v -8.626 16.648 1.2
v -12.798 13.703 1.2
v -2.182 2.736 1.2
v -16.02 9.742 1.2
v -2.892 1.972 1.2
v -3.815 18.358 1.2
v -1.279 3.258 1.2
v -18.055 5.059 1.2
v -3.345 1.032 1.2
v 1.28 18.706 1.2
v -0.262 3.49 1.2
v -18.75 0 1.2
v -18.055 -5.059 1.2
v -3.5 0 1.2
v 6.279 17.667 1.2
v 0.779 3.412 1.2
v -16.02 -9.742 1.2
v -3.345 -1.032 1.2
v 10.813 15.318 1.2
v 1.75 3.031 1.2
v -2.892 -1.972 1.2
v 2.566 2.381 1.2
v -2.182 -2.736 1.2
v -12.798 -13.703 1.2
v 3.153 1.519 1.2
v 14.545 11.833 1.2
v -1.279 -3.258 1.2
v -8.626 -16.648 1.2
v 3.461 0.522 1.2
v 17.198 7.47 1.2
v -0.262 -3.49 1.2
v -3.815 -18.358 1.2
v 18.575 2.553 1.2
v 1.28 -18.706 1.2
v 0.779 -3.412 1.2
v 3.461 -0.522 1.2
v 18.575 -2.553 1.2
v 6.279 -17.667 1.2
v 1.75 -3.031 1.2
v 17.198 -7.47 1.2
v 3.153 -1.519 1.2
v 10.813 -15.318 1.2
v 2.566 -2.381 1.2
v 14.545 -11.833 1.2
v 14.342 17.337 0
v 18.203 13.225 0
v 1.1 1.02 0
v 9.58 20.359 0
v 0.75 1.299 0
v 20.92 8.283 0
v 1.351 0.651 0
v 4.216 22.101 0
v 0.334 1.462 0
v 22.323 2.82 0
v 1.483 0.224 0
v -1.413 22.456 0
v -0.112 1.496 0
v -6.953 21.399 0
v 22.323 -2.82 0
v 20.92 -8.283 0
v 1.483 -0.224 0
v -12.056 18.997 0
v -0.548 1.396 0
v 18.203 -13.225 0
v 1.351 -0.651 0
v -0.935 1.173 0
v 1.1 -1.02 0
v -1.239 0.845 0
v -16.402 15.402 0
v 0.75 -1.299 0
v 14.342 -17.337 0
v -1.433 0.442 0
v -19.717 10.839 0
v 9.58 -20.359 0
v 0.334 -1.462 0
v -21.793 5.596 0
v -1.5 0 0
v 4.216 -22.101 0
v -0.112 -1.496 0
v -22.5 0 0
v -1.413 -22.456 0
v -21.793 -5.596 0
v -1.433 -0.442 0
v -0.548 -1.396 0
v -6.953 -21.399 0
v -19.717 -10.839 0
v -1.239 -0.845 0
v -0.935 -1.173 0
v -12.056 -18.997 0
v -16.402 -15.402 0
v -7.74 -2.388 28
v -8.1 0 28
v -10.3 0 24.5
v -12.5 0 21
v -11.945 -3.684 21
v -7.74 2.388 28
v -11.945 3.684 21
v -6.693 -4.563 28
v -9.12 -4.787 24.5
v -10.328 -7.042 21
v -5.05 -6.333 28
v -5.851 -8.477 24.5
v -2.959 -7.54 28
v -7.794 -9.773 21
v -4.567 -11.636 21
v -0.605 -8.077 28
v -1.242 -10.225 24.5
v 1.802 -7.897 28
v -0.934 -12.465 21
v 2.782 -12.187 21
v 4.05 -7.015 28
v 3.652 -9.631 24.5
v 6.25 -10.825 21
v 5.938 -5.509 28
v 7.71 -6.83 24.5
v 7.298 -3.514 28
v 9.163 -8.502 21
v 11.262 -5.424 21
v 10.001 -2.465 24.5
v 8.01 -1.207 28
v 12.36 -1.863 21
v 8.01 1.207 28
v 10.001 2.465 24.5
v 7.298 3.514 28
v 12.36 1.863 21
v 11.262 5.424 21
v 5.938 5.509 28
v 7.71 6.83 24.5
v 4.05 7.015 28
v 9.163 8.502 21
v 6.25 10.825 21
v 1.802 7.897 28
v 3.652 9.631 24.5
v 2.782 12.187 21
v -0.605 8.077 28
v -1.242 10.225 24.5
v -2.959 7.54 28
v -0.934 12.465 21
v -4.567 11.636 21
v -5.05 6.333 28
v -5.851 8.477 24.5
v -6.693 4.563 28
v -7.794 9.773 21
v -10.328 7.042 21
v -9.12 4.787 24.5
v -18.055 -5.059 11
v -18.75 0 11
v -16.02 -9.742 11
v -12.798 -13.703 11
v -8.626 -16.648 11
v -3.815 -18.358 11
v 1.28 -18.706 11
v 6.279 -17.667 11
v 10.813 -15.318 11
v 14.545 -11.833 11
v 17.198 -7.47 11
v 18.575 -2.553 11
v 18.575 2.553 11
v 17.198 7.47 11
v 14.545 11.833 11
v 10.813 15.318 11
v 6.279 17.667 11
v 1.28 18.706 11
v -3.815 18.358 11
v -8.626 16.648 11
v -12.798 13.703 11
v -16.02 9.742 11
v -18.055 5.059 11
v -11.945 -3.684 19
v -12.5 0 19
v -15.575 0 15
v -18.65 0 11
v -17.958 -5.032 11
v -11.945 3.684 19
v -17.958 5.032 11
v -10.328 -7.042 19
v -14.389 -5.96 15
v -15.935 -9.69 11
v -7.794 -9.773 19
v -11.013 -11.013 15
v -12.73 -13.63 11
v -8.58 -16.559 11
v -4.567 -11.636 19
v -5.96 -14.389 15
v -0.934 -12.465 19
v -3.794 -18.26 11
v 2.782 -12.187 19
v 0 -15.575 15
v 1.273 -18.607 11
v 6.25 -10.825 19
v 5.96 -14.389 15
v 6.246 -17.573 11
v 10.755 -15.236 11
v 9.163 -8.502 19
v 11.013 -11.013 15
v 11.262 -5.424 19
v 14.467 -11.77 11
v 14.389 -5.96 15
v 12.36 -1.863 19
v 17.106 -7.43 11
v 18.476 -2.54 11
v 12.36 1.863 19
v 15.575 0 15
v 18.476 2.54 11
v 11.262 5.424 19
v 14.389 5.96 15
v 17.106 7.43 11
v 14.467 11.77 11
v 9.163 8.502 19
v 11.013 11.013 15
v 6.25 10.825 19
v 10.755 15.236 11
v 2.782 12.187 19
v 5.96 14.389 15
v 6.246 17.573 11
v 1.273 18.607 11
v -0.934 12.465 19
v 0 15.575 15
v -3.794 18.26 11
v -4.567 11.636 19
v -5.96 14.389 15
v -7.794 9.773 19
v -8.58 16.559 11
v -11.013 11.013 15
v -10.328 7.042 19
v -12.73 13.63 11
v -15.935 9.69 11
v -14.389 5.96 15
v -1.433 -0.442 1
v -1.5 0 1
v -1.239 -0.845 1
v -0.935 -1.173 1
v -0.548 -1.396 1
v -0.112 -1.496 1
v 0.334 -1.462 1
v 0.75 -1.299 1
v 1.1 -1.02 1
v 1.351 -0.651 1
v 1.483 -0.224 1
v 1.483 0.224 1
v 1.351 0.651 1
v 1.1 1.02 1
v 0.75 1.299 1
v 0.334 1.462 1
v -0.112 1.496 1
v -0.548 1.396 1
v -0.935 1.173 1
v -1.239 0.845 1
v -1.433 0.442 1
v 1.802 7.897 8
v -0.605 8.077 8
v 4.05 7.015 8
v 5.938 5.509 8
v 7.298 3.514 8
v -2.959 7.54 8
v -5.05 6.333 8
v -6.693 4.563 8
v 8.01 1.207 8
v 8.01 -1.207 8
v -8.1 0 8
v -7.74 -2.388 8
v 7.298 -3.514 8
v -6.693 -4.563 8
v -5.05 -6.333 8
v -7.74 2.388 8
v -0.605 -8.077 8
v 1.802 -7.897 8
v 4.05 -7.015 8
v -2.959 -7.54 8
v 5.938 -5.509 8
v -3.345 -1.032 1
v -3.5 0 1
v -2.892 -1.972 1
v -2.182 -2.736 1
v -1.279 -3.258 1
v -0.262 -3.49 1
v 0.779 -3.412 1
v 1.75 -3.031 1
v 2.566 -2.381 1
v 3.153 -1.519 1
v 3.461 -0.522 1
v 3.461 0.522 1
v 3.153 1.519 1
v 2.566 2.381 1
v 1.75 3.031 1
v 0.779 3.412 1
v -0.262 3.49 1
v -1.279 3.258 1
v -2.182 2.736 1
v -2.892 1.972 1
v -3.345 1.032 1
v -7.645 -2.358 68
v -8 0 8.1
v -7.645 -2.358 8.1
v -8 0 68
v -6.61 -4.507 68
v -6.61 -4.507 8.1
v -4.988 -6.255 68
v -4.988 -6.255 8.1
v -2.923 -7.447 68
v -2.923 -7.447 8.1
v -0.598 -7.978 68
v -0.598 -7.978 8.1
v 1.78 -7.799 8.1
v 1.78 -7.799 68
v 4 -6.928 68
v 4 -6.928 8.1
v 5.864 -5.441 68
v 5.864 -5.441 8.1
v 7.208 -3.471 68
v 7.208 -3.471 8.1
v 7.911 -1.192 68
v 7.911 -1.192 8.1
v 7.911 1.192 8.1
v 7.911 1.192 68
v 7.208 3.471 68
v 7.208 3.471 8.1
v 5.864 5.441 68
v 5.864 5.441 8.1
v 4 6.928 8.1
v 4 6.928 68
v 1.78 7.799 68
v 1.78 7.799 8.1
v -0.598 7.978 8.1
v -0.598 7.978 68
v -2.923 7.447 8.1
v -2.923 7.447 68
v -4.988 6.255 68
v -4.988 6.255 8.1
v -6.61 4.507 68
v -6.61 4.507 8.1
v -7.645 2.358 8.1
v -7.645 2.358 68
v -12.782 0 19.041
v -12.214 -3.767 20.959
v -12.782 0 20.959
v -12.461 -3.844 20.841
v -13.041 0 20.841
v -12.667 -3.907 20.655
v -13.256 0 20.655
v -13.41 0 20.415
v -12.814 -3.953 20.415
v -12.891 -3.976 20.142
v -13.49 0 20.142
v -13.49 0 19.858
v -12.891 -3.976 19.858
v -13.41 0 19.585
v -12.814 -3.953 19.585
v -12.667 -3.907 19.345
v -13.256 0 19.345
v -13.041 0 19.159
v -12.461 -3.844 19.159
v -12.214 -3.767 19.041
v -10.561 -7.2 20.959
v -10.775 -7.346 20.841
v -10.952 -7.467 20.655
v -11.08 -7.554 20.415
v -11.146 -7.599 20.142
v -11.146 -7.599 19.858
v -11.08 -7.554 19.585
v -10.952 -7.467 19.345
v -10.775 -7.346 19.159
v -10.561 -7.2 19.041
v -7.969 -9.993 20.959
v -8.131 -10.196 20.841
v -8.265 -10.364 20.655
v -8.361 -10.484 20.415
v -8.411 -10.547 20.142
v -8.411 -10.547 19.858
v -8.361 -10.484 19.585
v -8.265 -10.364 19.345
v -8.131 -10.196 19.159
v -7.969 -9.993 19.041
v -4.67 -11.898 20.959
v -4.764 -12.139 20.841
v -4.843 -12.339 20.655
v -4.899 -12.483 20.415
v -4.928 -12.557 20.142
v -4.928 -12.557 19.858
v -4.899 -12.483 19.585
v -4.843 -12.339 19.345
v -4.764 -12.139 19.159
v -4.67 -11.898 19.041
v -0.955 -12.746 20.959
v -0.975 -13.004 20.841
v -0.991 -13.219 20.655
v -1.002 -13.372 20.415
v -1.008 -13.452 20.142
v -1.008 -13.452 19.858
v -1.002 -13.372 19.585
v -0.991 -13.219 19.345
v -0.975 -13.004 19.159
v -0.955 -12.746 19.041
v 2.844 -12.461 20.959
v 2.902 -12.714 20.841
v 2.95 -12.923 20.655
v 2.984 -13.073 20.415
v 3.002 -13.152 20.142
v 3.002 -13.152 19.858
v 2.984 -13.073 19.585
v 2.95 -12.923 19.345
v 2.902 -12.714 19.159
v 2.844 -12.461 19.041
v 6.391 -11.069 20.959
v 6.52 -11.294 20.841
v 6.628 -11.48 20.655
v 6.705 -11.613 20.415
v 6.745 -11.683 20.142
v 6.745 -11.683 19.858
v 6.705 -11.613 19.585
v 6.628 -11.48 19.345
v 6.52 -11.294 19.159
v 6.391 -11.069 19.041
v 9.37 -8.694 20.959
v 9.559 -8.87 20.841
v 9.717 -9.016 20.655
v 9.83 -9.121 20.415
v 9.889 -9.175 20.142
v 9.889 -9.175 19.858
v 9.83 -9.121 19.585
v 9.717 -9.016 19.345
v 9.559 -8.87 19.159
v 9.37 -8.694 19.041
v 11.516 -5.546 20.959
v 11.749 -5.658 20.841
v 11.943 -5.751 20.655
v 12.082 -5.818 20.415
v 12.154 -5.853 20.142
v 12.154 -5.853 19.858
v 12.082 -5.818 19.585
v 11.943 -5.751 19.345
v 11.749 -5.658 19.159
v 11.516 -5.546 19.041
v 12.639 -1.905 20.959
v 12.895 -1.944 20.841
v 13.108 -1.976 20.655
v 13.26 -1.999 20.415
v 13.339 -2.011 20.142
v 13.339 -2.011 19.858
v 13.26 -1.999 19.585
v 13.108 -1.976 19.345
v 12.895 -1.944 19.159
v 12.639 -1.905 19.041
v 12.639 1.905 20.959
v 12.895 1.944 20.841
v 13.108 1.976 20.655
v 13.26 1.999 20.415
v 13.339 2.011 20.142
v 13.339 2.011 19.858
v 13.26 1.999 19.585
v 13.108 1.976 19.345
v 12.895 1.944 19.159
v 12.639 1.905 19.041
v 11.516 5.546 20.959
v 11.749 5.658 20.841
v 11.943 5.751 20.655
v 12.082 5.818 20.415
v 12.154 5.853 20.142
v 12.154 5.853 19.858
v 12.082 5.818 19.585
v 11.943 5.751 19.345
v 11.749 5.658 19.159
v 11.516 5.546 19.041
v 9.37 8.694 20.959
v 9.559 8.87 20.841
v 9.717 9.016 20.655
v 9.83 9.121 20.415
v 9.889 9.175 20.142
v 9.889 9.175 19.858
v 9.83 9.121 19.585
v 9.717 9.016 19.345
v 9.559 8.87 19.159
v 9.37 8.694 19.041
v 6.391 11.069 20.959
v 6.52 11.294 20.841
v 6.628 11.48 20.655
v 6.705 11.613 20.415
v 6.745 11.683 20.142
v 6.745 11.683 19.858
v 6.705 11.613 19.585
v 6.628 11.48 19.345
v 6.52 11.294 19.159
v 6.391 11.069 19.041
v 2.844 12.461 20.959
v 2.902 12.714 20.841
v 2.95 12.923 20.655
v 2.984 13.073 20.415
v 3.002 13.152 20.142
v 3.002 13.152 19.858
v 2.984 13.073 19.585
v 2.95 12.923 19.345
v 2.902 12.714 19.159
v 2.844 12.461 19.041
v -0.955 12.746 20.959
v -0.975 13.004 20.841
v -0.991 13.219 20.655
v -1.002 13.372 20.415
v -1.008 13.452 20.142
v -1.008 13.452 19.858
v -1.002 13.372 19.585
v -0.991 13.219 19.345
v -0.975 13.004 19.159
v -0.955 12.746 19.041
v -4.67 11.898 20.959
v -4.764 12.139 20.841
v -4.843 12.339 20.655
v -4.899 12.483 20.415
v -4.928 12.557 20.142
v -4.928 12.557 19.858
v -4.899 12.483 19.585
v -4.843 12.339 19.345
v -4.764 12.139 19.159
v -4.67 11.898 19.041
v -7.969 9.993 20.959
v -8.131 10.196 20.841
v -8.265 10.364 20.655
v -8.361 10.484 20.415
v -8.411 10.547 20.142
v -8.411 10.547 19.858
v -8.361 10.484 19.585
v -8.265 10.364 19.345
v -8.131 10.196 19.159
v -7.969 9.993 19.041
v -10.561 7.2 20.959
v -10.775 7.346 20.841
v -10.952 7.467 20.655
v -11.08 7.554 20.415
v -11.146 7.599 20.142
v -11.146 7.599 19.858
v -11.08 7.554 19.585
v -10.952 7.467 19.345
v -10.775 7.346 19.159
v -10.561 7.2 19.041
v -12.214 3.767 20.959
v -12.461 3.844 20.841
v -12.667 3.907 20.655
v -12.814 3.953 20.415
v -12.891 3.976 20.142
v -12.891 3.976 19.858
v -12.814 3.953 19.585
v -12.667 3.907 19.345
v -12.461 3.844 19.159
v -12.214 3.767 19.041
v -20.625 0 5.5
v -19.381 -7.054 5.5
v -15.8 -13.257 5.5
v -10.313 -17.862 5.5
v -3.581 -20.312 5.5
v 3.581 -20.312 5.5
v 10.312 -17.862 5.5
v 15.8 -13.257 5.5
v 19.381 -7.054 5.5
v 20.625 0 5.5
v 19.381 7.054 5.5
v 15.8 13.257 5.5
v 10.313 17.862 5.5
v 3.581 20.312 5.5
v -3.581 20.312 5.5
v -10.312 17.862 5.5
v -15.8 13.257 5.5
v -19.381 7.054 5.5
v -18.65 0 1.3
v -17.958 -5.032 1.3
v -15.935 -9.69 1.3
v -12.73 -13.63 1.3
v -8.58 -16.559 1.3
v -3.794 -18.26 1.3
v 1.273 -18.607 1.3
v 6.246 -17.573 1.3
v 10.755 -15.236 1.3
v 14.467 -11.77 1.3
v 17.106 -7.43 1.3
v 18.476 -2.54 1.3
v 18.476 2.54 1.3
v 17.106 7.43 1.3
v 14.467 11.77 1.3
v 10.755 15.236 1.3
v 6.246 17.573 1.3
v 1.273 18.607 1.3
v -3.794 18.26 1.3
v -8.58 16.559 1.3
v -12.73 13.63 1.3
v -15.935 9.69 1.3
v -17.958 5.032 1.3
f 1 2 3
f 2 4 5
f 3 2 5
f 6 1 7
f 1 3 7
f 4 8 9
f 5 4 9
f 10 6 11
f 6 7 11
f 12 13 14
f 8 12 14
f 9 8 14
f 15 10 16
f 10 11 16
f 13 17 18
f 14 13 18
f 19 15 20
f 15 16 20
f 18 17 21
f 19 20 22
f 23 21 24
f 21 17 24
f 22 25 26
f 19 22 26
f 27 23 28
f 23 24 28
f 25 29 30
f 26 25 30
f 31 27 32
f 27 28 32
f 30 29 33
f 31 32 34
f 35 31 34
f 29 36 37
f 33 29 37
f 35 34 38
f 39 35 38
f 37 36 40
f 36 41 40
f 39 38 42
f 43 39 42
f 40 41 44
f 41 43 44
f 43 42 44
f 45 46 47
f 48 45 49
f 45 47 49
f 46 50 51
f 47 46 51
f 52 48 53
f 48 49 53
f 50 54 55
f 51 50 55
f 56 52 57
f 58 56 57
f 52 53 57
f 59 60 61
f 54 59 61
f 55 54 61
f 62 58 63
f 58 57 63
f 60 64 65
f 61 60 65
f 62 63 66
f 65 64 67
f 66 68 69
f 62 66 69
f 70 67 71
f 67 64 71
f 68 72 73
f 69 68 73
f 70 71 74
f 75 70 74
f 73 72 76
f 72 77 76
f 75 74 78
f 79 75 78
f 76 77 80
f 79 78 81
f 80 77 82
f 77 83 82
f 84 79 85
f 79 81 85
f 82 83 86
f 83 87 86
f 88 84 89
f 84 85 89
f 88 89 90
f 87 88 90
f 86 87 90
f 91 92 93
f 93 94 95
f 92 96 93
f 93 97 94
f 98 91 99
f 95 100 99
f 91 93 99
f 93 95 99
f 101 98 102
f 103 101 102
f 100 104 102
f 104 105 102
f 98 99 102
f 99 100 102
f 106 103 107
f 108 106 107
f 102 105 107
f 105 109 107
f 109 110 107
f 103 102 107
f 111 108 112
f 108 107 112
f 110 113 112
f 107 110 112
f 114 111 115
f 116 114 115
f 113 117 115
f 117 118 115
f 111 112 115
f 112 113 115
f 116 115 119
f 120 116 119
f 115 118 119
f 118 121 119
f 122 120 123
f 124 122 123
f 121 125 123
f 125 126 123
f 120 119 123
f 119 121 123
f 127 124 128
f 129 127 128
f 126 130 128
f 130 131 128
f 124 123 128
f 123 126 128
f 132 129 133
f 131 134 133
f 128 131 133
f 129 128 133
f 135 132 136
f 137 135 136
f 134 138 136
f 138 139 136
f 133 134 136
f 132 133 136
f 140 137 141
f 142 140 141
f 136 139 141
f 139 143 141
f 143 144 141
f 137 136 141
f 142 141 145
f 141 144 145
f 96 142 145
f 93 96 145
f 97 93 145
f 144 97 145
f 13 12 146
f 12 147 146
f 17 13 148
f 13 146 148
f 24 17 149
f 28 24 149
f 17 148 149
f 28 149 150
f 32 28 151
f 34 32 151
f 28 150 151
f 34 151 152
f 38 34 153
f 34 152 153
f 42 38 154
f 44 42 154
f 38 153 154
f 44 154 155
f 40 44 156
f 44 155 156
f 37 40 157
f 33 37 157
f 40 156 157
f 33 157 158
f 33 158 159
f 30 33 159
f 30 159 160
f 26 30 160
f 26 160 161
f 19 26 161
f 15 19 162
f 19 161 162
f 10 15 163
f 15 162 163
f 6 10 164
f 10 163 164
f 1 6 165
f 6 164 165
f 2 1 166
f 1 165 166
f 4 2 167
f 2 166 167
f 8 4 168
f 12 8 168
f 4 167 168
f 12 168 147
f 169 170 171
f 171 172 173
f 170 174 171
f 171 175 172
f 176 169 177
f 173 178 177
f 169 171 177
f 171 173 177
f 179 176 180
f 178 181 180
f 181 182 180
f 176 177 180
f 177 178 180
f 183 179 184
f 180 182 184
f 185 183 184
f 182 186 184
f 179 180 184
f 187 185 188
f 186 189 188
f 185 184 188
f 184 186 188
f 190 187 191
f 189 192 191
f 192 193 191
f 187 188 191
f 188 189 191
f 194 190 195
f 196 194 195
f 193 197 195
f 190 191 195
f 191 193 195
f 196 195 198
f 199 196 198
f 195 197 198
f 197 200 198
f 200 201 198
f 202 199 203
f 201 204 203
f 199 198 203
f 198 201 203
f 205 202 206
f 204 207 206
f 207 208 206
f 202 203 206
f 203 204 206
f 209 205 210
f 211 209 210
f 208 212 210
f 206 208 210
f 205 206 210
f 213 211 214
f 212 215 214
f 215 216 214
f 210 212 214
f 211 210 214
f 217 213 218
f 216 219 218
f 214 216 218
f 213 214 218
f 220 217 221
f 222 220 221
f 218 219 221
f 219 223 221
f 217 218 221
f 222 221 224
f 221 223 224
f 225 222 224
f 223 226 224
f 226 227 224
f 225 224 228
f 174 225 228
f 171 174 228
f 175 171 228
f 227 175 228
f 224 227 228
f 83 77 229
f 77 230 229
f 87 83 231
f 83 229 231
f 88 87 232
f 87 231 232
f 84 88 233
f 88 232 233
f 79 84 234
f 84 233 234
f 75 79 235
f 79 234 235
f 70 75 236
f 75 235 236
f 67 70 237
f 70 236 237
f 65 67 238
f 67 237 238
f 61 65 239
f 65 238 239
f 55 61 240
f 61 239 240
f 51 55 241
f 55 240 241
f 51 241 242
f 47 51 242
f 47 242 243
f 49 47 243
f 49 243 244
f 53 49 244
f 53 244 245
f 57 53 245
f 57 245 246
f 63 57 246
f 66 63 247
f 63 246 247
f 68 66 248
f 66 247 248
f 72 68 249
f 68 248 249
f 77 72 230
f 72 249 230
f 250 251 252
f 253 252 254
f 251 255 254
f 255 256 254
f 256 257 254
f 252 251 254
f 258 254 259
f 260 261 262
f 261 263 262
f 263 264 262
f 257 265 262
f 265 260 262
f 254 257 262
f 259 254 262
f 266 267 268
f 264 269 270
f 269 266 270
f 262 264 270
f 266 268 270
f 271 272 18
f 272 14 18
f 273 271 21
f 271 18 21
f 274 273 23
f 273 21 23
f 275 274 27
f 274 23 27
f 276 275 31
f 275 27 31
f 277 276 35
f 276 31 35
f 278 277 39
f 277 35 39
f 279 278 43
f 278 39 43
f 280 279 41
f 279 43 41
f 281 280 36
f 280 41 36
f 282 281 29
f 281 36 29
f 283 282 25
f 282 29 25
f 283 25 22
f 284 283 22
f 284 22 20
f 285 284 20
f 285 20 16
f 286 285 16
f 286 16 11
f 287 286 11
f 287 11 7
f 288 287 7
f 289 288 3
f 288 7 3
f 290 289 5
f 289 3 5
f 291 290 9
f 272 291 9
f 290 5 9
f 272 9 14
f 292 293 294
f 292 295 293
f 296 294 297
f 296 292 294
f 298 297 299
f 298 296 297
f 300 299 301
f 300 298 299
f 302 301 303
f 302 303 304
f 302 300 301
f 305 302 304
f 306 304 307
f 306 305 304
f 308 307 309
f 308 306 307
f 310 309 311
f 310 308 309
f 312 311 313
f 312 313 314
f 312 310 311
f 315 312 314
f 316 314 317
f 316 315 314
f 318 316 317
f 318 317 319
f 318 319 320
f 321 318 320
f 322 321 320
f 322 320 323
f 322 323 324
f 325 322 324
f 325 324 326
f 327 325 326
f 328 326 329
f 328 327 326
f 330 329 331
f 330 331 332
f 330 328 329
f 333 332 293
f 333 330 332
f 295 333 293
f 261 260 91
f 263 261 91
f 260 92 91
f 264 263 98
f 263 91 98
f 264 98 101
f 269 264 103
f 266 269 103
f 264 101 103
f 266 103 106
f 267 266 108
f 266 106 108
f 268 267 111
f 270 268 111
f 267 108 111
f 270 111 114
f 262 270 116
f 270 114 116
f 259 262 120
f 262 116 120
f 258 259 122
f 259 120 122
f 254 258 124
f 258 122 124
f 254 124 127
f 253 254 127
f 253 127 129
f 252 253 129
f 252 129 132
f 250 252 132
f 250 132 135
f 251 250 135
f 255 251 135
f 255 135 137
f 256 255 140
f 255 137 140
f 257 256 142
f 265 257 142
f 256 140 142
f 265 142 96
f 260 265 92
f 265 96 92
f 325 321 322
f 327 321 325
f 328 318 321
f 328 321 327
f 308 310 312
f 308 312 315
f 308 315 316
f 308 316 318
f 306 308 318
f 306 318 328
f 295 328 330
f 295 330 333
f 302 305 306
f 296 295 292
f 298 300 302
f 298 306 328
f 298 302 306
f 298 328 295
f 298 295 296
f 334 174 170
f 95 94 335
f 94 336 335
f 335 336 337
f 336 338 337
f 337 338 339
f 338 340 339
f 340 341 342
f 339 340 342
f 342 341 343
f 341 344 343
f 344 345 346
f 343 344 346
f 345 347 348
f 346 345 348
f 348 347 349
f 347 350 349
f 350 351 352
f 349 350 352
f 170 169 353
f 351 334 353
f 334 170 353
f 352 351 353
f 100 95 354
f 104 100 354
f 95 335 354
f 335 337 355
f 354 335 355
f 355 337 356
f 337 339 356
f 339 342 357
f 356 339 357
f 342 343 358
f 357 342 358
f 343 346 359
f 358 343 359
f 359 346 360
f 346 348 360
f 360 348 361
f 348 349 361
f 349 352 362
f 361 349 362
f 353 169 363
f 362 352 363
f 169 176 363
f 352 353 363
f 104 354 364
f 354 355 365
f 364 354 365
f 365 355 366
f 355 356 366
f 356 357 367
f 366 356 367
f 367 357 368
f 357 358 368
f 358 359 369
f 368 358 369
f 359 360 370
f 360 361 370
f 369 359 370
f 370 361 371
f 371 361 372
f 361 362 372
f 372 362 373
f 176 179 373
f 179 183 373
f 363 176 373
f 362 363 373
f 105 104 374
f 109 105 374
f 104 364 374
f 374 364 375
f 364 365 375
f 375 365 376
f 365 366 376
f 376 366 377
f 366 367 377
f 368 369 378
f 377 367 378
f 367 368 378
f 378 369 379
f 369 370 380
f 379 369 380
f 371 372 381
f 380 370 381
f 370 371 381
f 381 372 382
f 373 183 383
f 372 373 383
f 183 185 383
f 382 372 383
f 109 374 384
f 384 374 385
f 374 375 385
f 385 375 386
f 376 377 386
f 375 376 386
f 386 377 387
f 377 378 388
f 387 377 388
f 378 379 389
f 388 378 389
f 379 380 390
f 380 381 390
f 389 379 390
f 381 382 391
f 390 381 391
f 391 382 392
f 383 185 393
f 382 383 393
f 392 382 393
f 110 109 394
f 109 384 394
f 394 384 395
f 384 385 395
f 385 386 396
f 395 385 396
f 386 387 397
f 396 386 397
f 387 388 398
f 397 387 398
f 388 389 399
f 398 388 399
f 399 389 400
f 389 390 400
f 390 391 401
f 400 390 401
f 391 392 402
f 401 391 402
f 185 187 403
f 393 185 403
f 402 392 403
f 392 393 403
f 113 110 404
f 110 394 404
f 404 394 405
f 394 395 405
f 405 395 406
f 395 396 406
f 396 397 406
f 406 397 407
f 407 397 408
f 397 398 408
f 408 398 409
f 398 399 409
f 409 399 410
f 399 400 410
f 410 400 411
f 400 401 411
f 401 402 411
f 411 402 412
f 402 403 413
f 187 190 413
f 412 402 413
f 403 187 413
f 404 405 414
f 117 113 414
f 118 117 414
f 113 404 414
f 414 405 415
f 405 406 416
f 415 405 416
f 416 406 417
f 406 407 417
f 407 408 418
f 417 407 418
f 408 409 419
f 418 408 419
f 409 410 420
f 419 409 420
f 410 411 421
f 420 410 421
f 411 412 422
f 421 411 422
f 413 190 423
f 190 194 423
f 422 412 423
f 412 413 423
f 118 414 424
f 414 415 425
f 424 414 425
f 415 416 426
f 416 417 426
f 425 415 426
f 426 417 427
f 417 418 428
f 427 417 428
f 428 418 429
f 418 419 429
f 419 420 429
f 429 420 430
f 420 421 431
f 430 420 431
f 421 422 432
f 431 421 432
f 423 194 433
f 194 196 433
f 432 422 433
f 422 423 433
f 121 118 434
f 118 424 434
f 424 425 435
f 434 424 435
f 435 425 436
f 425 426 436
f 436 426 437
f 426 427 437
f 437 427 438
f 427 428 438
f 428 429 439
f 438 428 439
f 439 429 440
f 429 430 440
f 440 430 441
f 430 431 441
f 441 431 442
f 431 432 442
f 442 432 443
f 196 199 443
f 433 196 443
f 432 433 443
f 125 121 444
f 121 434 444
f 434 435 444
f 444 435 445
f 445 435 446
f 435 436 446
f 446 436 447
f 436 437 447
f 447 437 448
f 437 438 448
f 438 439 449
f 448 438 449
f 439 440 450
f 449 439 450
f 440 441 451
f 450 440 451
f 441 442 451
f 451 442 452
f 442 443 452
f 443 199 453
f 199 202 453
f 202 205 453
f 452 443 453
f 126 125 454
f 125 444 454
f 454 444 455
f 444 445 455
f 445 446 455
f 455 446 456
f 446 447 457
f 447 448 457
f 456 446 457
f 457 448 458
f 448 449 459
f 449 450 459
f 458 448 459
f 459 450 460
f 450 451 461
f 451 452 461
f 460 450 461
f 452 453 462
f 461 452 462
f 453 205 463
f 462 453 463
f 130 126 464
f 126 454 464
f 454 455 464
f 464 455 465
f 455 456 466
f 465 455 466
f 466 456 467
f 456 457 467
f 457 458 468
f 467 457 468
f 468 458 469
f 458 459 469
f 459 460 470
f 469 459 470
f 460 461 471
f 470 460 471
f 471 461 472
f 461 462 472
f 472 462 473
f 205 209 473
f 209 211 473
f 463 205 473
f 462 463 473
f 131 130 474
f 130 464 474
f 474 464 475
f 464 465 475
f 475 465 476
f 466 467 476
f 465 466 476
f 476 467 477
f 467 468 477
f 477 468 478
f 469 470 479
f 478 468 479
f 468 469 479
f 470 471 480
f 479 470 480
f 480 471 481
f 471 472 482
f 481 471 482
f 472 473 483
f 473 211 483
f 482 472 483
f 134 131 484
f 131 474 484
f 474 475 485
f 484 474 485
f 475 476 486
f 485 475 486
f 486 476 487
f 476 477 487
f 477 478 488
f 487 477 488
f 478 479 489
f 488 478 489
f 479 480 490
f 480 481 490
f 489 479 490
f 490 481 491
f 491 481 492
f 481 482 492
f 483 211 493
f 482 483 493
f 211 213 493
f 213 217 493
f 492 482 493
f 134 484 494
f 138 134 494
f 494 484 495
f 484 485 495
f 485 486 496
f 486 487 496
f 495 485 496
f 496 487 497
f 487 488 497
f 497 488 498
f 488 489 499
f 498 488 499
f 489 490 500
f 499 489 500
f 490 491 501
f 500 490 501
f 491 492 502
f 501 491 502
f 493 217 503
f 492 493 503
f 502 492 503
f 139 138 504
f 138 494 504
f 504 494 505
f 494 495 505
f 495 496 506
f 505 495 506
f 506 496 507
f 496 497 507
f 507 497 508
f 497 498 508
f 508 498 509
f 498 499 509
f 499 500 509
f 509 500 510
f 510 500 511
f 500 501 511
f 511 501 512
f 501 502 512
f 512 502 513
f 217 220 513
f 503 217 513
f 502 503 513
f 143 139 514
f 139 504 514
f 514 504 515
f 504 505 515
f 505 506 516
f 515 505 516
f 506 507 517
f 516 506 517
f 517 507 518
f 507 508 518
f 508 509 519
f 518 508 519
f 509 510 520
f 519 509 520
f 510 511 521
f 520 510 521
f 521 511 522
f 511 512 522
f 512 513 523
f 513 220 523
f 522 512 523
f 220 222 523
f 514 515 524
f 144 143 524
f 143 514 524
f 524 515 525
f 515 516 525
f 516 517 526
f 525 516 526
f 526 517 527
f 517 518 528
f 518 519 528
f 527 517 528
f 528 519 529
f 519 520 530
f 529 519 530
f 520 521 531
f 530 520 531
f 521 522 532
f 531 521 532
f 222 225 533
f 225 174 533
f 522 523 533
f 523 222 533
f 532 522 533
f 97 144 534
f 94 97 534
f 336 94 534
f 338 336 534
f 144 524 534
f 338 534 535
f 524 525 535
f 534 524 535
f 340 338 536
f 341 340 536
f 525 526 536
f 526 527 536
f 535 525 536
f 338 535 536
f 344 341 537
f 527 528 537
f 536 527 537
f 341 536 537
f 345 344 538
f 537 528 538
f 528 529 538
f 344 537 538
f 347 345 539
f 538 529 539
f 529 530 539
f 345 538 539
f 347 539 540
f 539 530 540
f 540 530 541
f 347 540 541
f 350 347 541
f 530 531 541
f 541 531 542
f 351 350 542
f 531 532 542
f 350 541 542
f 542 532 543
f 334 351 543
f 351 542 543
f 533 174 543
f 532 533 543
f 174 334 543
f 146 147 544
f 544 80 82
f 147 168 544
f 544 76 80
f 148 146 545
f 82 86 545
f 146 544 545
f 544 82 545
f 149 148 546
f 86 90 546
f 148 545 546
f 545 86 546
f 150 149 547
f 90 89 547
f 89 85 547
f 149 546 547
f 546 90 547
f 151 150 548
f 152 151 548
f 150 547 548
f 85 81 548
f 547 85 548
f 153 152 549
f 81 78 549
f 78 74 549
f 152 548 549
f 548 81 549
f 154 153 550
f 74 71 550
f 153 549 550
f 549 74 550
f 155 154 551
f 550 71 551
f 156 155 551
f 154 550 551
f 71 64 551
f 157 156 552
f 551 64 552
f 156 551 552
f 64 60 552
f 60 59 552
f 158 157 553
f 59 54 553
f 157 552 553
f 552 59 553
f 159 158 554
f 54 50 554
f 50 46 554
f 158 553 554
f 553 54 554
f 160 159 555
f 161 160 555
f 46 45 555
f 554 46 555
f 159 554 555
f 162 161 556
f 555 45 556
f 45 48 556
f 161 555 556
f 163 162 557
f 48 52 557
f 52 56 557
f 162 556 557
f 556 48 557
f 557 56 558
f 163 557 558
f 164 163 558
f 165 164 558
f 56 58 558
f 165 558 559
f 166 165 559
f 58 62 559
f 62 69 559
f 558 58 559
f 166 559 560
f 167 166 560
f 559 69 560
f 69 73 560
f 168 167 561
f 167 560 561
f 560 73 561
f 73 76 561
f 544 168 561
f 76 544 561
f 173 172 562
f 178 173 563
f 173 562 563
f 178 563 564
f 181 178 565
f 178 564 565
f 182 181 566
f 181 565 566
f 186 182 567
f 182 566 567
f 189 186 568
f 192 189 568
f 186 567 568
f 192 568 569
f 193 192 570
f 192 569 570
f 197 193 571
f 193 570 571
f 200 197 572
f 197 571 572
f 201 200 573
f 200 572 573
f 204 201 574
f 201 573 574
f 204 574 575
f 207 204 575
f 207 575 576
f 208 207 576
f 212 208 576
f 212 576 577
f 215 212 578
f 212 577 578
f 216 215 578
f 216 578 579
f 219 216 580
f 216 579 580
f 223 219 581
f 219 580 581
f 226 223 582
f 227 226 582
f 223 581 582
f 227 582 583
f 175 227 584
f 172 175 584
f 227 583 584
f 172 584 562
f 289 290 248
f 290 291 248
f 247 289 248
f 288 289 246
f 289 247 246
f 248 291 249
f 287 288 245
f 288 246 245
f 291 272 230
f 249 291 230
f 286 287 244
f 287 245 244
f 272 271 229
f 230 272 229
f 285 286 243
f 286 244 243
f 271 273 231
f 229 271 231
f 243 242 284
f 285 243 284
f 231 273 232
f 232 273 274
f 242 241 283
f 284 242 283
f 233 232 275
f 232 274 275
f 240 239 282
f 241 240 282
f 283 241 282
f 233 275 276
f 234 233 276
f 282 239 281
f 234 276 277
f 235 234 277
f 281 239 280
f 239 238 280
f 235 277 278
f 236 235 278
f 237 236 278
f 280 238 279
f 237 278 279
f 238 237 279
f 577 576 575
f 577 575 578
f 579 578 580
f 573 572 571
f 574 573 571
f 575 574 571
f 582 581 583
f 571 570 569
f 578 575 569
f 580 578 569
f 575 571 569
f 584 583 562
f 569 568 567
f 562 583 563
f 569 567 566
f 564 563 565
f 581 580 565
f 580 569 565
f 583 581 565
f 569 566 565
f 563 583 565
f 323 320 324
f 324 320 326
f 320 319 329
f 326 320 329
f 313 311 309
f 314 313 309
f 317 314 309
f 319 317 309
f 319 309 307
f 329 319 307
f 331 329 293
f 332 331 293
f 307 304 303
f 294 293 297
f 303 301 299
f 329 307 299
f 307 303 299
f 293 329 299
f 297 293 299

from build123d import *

# Parameters (mm, degrees)
F0_W = 8
F0_H = 59.9


with BuildPart() as f1:
    # F0 (on Front) → F1 (revolve)
    with BuildSketch(Plane.XZ):
        Polygon((-22.5, 0), (-1.5, 0), (-1.5, 1), (-3.5, 1), (-3.5, 1.2), (-18.75, 1.2), (-18.75, 11), align=None)
        with BuildLine():
            Line((-18.65, 11), (-18.65, 1.3))
            Line((-18.65, 1.3), (0, 1.3))
            Line((0, 1.3), (0, 8))
            Line((0, 8), (-8.1, 8))
            Line((-8.1, 8), (-8.1, 28))
            Line((-8.1, 28), (-12.5, 21))
            ThreePointArc((-12.5, 21), (-13.5, 20), (-12.5, 19))
            Line((-12.5, 19), (-18.65, 11))
        make_face()
        with Locations((-4, 38.05)):
            Rectangle(F0_W, F0_H)
    revolve(axis=Axis((0, 0, 0.069721), (0, 0, 1)))


solid = f1.part
